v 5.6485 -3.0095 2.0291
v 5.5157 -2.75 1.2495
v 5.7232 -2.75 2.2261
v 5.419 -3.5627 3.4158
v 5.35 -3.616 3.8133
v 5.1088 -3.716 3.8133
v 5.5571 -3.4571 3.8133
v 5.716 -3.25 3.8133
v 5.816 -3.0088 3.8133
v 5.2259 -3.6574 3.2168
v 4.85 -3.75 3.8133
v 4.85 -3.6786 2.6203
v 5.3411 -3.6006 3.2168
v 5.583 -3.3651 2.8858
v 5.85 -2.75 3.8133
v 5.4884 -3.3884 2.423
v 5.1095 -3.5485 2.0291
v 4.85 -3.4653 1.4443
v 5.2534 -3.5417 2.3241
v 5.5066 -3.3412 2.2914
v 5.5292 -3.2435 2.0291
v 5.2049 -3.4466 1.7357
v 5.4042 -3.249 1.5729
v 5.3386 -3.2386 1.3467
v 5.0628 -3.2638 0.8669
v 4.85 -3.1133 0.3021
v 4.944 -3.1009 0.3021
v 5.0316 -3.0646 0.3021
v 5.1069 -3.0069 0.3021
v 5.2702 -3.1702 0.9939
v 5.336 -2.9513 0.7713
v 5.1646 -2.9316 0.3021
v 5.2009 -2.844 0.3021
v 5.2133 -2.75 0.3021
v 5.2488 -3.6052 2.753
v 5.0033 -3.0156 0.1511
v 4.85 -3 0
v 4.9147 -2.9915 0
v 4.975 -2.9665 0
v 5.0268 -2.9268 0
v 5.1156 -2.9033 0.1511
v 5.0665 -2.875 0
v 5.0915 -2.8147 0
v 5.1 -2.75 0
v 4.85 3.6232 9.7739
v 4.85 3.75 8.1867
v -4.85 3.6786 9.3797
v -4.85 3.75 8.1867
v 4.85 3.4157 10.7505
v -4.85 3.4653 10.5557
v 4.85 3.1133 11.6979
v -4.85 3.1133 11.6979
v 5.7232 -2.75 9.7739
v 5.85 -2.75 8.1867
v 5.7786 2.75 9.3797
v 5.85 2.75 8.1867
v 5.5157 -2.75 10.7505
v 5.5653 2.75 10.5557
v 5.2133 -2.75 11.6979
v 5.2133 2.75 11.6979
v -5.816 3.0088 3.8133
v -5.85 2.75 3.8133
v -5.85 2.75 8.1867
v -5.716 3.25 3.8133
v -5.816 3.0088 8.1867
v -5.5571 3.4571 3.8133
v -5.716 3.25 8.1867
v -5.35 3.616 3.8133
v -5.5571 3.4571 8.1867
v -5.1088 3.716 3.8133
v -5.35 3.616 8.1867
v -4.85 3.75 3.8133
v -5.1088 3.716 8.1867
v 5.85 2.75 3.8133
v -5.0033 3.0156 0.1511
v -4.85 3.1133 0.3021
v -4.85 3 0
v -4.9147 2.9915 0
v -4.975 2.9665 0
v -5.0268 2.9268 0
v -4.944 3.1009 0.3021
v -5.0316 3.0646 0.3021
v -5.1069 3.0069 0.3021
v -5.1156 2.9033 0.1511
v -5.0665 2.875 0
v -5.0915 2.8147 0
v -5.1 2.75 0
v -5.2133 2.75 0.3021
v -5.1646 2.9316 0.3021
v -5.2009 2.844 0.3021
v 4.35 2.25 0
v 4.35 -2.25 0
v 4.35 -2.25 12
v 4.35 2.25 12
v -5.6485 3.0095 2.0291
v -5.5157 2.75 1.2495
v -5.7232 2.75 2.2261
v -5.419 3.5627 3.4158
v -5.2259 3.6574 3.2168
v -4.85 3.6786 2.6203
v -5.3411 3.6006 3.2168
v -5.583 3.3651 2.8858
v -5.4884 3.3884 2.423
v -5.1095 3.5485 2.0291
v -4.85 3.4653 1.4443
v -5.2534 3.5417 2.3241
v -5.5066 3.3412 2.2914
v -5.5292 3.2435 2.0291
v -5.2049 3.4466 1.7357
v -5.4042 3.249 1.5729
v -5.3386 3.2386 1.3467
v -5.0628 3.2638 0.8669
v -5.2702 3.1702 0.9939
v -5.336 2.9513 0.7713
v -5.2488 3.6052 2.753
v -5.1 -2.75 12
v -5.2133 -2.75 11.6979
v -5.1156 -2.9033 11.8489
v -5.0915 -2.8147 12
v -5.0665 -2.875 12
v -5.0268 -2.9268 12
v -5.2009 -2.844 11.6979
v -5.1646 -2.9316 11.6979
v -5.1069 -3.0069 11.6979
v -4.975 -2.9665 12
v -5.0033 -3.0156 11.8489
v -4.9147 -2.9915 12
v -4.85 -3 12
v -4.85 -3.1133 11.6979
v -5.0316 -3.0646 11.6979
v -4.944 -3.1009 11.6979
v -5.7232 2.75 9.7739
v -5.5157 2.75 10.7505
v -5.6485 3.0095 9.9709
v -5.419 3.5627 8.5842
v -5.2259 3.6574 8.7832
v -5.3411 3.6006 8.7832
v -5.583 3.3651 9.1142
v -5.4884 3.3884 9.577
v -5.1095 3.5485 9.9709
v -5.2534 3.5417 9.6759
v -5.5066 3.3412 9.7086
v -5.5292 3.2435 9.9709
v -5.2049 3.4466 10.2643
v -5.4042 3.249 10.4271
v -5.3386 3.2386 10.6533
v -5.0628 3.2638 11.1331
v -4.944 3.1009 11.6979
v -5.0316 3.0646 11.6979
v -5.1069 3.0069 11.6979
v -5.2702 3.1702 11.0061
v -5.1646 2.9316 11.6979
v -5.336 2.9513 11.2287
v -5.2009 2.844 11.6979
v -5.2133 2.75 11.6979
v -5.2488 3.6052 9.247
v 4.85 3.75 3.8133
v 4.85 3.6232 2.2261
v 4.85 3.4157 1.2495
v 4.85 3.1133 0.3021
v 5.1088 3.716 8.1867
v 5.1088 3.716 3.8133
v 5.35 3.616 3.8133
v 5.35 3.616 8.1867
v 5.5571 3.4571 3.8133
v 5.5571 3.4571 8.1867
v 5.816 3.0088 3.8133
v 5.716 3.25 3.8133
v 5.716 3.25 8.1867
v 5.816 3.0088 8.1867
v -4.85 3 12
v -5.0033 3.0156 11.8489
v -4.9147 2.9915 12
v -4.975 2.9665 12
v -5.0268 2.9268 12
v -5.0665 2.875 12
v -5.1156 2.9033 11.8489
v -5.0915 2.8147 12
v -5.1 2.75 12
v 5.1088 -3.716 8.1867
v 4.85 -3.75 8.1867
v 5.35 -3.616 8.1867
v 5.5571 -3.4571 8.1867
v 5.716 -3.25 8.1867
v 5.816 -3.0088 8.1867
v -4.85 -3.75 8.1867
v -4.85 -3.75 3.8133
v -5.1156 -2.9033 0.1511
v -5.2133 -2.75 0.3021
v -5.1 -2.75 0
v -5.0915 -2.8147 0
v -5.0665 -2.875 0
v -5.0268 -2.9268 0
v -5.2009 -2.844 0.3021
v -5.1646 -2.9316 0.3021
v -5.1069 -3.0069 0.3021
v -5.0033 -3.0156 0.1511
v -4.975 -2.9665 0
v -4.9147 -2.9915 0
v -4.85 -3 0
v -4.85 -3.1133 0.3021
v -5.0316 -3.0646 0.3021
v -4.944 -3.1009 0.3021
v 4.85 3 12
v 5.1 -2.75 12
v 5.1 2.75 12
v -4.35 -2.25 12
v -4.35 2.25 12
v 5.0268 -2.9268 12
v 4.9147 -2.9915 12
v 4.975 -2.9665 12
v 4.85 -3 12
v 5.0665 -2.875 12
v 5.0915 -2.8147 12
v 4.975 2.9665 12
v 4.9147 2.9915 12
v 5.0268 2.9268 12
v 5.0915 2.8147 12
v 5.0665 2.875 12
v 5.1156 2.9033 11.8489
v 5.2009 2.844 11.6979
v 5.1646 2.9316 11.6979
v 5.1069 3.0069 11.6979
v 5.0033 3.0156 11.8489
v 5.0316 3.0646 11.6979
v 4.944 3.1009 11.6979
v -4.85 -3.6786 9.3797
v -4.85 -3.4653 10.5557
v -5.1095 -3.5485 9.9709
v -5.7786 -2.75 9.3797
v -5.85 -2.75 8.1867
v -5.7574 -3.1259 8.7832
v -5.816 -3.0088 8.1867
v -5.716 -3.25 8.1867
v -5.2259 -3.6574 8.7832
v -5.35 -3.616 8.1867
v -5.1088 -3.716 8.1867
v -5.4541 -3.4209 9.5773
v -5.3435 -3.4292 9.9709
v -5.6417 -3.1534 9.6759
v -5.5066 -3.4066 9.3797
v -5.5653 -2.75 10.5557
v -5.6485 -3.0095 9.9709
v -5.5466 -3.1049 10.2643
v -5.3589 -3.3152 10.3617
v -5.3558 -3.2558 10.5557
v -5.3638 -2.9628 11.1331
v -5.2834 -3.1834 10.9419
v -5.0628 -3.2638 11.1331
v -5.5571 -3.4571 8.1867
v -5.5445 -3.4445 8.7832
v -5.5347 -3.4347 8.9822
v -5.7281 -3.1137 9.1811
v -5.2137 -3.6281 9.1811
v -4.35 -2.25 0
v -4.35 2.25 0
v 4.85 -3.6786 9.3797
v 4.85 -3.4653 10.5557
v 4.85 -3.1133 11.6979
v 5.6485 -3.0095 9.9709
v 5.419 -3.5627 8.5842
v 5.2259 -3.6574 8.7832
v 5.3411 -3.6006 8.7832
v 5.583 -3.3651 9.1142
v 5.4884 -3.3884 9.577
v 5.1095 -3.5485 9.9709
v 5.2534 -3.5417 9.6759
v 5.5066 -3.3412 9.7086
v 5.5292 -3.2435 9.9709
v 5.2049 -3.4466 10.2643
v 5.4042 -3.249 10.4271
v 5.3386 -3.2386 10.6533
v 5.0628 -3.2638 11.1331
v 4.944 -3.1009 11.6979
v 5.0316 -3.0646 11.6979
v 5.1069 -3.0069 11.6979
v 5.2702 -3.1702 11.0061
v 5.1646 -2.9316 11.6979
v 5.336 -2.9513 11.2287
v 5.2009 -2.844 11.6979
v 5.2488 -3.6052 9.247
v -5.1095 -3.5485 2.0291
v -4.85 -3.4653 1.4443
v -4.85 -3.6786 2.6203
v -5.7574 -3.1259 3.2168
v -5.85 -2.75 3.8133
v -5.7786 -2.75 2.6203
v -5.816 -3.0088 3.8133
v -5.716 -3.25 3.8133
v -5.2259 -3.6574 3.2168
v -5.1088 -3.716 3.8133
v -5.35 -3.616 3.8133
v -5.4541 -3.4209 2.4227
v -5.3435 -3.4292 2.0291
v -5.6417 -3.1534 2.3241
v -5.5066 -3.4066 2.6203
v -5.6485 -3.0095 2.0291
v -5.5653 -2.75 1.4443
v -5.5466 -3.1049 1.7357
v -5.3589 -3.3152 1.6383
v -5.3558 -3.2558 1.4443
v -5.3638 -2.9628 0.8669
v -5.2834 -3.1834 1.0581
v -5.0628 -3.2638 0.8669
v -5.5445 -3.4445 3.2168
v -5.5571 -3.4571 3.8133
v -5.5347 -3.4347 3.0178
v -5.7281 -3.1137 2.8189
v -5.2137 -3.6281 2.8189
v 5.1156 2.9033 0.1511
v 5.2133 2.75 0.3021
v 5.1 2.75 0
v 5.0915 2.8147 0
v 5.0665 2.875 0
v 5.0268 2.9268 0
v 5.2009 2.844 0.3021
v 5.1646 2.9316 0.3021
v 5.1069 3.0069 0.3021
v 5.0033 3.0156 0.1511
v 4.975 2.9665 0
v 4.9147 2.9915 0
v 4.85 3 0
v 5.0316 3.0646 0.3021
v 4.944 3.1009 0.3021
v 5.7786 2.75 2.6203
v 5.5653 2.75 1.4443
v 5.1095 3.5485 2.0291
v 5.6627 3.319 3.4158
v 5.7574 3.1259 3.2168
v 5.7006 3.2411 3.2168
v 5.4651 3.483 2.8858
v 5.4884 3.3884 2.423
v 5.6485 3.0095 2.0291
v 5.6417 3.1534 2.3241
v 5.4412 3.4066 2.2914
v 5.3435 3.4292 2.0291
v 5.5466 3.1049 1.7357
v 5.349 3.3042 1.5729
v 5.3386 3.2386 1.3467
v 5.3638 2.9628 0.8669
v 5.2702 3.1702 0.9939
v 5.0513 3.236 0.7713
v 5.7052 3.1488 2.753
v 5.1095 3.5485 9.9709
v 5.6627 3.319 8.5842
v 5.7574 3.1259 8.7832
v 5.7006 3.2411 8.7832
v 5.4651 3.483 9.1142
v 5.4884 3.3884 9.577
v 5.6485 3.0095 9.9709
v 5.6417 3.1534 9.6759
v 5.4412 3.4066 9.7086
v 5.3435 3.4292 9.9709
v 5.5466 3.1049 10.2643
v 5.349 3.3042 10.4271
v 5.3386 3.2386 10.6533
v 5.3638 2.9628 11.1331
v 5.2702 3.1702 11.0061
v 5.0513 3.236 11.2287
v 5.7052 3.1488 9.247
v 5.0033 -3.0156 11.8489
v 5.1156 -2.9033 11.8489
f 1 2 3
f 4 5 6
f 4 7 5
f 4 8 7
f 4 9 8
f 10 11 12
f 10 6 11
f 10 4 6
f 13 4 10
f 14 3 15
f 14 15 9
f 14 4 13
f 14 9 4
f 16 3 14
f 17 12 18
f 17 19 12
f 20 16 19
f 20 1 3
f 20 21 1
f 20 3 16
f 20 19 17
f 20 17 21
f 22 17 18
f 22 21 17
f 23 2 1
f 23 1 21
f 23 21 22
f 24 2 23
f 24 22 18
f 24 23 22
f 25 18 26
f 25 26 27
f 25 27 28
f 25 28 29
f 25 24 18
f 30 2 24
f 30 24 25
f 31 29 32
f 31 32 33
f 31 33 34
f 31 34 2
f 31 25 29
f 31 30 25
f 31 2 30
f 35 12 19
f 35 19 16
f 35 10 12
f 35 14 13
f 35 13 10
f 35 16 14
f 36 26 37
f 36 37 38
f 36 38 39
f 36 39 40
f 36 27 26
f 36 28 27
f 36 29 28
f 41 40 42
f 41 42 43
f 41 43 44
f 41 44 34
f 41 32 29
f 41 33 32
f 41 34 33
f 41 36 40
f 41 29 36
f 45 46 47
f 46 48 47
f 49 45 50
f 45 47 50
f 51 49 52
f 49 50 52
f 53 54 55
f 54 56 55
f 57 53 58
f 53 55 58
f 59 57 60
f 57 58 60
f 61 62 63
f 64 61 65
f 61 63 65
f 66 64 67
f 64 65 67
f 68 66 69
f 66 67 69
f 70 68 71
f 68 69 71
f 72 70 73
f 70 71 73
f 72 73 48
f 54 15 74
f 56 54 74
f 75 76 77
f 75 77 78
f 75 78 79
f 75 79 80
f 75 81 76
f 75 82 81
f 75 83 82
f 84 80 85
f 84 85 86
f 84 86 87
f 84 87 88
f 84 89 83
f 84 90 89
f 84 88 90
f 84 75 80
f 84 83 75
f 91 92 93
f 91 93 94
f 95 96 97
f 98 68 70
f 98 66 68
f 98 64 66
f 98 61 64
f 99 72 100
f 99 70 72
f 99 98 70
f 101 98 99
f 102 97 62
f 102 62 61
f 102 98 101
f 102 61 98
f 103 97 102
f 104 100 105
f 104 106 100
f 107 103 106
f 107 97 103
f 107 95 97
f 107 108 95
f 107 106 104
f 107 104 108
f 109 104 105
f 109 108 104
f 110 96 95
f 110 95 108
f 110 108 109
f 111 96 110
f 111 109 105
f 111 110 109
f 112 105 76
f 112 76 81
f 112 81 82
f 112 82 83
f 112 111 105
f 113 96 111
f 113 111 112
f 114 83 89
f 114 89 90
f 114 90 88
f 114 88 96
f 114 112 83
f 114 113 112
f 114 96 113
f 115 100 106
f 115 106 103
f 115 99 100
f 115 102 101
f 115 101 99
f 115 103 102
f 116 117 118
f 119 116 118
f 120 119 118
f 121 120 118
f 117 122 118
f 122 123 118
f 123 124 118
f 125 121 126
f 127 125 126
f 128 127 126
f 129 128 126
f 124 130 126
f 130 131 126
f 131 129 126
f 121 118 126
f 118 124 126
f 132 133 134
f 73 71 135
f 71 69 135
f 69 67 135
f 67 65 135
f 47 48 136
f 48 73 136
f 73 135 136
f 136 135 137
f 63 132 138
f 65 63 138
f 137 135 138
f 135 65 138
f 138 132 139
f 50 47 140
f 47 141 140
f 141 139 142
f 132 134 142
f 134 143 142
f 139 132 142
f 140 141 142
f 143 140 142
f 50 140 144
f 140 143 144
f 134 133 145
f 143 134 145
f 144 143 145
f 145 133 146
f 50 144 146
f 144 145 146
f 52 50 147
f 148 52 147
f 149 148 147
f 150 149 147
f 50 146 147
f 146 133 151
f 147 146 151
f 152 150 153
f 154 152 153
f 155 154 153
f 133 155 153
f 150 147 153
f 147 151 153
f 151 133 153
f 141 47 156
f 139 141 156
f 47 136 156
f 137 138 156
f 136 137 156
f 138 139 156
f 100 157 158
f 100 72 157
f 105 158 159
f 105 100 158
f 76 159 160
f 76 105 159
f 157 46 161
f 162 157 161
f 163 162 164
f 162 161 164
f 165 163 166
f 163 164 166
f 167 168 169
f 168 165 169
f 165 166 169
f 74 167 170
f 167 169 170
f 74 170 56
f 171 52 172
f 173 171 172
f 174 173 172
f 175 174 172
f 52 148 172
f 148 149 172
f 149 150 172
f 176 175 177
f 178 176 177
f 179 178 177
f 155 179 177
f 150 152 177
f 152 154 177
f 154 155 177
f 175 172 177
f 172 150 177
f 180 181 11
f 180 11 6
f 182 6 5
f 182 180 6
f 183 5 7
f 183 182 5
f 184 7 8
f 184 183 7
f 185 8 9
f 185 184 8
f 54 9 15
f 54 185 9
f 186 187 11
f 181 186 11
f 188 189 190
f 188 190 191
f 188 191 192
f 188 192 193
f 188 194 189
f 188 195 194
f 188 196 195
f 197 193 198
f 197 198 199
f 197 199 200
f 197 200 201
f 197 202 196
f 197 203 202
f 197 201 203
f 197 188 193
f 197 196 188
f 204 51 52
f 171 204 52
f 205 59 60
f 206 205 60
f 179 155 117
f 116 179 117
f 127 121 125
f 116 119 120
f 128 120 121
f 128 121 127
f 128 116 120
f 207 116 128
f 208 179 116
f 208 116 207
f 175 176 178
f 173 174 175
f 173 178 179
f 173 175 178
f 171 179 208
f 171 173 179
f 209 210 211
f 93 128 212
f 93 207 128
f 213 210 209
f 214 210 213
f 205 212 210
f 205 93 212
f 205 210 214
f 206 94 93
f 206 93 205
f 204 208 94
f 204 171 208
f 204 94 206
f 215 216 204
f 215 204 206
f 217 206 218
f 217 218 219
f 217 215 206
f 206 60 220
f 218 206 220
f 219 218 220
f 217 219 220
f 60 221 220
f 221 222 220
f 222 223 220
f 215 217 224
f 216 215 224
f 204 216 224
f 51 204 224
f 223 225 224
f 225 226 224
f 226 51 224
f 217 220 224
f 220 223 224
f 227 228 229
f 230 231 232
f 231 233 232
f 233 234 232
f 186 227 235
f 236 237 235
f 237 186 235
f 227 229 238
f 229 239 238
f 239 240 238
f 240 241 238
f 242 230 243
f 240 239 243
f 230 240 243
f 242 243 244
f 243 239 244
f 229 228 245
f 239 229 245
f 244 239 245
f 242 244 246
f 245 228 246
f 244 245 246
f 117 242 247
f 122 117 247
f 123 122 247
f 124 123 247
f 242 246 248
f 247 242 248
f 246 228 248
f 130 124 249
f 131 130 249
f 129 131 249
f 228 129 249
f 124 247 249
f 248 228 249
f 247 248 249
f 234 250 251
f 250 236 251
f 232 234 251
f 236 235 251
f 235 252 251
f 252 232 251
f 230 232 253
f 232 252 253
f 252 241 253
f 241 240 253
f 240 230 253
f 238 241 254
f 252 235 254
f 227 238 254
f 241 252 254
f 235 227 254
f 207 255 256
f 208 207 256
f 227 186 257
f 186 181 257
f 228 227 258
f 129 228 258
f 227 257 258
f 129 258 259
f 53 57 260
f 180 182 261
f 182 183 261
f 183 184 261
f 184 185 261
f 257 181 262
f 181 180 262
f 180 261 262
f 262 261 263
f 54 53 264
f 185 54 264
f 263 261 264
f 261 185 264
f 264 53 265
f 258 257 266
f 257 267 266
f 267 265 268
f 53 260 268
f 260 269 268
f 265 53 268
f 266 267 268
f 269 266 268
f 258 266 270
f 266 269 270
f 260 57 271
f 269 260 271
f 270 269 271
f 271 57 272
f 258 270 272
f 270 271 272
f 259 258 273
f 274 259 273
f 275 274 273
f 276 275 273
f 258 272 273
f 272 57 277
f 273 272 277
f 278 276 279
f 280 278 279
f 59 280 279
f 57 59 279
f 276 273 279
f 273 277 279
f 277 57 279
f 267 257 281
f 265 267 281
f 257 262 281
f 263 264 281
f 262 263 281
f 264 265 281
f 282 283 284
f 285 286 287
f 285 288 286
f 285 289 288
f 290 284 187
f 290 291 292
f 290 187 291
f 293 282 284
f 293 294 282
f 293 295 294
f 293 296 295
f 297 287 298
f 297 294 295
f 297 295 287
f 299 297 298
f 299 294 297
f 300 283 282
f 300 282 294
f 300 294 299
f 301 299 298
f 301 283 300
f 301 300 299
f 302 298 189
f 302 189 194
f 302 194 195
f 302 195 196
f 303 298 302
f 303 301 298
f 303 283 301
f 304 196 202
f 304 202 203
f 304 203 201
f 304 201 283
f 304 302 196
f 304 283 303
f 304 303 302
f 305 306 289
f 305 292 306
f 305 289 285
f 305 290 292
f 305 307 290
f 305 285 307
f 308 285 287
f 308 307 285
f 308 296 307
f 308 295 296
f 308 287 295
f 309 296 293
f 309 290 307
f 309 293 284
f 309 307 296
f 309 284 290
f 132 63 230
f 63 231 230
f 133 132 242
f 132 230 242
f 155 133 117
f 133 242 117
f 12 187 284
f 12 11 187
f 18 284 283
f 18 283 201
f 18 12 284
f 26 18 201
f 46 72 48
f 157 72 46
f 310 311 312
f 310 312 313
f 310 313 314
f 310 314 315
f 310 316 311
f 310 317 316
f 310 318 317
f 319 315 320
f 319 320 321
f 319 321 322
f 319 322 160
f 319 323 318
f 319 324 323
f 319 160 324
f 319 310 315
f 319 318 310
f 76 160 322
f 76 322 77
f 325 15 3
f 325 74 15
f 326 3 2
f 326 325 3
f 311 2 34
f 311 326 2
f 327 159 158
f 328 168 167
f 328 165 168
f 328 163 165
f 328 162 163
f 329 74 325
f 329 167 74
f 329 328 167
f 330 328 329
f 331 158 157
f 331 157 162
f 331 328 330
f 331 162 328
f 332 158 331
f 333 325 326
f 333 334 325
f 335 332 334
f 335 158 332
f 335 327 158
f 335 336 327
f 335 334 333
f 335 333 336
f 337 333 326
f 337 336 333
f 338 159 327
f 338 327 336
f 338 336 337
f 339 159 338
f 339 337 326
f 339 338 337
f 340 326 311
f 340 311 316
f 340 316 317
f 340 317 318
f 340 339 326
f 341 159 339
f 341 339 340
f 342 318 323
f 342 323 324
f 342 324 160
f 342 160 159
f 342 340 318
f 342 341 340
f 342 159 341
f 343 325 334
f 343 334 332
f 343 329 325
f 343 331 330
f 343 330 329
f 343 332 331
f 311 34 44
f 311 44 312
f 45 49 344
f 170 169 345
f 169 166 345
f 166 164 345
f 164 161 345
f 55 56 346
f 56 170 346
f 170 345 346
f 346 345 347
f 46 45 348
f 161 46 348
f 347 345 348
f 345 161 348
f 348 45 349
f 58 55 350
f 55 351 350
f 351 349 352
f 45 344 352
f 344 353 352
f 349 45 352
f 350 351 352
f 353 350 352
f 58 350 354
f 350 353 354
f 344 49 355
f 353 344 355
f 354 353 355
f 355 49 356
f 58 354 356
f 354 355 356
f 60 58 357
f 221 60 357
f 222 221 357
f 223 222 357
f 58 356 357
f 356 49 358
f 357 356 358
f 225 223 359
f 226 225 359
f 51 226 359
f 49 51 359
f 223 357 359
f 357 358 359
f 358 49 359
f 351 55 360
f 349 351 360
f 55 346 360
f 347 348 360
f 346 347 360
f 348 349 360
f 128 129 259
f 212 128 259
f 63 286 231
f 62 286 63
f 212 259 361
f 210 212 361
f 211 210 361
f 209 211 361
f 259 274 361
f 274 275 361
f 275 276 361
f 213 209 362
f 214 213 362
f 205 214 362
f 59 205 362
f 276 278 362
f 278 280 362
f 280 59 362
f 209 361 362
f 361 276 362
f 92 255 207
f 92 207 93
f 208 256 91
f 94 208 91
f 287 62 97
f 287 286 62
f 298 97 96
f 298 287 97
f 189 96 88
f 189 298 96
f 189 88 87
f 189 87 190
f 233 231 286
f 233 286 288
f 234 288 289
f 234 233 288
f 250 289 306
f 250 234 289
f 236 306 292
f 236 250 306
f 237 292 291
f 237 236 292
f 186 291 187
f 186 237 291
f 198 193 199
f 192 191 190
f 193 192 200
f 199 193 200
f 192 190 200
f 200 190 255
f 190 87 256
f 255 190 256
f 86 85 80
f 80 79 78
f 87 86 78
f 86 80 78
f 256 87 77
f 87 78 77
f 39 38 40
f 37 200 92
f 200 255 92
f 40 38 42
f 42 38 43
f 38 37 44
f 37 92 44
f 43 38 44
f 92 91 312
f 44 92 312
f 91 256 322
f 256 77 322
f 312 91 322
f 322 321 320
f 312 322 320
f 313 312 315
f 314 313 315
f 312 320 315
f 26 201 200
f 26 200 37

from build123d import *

# Parameters (mm, degrees)
F0_W       = 11.7
F0_H       = 7.5
F0_W_2     = 8.7
F0_H_2     = 4.5
F1_DEPTH   = 12
F2_R       = 1
F3_SIZE2   = 2
F3_SIZE    = 0.75
F3_2_SIZE2 = 2
F3_2_SIZE  = 0.75
F4_R       = 10


with BuildPart() as f1:
    # F0 (on Top) → F1 (new body)
    with BuildSketch(Plane.XY):
        Rectangle(F0_W, F0_H)
        Rectangle(F0_W_2, F0_H_2, mode=Mode.SUBTRACT)
    extrude(amount=F1_DEPTH)

    # F2
    f2_edges = [f1.edges().sort_by_distance(p)[0] for p in [
        (5.85, -3.75, 6),
        (-5.85, -3.75, 6),
        (-5.85, 3.75, 6),
        (5.85, 3.75, 6),
    ]]
    fillet(f2_edges, radius=F2_R)

    # F3
    f3_edges = [f1.edges().sort_by_distance(p)[0] for p in [
        (0, -3.75, 12),
    ]]
    f3_side = f1.faces().sort_by_distance((0, -3.611025, 12))[0]
    chamfer(f3_edges, length=F3_SIZE, length2=F3_SIZE2, reference=f3_side)

    # F3#2
    f3_2_edges = [f1.edges().sort_by_distance(p)[0] for p in [
        (0, -3.75, 0),
    ]]
    f3_2_side = f1.faces().sort_by_distance((0, -3.611025, 0))[0]
    chamfer(f3_2_edges, length=F3_2_SIZE, length2=F3_2_SIZE2, reference=f3_2_side)

    # F4
    f4_edges = [f1.edges().sort_by_distance(p)[0] for p in [
        (0, -3.75, 2),
        (0, -3.75, 10),
    ]]
    fillet(f4_edges, radius=F4_R)


solid = f1.part
